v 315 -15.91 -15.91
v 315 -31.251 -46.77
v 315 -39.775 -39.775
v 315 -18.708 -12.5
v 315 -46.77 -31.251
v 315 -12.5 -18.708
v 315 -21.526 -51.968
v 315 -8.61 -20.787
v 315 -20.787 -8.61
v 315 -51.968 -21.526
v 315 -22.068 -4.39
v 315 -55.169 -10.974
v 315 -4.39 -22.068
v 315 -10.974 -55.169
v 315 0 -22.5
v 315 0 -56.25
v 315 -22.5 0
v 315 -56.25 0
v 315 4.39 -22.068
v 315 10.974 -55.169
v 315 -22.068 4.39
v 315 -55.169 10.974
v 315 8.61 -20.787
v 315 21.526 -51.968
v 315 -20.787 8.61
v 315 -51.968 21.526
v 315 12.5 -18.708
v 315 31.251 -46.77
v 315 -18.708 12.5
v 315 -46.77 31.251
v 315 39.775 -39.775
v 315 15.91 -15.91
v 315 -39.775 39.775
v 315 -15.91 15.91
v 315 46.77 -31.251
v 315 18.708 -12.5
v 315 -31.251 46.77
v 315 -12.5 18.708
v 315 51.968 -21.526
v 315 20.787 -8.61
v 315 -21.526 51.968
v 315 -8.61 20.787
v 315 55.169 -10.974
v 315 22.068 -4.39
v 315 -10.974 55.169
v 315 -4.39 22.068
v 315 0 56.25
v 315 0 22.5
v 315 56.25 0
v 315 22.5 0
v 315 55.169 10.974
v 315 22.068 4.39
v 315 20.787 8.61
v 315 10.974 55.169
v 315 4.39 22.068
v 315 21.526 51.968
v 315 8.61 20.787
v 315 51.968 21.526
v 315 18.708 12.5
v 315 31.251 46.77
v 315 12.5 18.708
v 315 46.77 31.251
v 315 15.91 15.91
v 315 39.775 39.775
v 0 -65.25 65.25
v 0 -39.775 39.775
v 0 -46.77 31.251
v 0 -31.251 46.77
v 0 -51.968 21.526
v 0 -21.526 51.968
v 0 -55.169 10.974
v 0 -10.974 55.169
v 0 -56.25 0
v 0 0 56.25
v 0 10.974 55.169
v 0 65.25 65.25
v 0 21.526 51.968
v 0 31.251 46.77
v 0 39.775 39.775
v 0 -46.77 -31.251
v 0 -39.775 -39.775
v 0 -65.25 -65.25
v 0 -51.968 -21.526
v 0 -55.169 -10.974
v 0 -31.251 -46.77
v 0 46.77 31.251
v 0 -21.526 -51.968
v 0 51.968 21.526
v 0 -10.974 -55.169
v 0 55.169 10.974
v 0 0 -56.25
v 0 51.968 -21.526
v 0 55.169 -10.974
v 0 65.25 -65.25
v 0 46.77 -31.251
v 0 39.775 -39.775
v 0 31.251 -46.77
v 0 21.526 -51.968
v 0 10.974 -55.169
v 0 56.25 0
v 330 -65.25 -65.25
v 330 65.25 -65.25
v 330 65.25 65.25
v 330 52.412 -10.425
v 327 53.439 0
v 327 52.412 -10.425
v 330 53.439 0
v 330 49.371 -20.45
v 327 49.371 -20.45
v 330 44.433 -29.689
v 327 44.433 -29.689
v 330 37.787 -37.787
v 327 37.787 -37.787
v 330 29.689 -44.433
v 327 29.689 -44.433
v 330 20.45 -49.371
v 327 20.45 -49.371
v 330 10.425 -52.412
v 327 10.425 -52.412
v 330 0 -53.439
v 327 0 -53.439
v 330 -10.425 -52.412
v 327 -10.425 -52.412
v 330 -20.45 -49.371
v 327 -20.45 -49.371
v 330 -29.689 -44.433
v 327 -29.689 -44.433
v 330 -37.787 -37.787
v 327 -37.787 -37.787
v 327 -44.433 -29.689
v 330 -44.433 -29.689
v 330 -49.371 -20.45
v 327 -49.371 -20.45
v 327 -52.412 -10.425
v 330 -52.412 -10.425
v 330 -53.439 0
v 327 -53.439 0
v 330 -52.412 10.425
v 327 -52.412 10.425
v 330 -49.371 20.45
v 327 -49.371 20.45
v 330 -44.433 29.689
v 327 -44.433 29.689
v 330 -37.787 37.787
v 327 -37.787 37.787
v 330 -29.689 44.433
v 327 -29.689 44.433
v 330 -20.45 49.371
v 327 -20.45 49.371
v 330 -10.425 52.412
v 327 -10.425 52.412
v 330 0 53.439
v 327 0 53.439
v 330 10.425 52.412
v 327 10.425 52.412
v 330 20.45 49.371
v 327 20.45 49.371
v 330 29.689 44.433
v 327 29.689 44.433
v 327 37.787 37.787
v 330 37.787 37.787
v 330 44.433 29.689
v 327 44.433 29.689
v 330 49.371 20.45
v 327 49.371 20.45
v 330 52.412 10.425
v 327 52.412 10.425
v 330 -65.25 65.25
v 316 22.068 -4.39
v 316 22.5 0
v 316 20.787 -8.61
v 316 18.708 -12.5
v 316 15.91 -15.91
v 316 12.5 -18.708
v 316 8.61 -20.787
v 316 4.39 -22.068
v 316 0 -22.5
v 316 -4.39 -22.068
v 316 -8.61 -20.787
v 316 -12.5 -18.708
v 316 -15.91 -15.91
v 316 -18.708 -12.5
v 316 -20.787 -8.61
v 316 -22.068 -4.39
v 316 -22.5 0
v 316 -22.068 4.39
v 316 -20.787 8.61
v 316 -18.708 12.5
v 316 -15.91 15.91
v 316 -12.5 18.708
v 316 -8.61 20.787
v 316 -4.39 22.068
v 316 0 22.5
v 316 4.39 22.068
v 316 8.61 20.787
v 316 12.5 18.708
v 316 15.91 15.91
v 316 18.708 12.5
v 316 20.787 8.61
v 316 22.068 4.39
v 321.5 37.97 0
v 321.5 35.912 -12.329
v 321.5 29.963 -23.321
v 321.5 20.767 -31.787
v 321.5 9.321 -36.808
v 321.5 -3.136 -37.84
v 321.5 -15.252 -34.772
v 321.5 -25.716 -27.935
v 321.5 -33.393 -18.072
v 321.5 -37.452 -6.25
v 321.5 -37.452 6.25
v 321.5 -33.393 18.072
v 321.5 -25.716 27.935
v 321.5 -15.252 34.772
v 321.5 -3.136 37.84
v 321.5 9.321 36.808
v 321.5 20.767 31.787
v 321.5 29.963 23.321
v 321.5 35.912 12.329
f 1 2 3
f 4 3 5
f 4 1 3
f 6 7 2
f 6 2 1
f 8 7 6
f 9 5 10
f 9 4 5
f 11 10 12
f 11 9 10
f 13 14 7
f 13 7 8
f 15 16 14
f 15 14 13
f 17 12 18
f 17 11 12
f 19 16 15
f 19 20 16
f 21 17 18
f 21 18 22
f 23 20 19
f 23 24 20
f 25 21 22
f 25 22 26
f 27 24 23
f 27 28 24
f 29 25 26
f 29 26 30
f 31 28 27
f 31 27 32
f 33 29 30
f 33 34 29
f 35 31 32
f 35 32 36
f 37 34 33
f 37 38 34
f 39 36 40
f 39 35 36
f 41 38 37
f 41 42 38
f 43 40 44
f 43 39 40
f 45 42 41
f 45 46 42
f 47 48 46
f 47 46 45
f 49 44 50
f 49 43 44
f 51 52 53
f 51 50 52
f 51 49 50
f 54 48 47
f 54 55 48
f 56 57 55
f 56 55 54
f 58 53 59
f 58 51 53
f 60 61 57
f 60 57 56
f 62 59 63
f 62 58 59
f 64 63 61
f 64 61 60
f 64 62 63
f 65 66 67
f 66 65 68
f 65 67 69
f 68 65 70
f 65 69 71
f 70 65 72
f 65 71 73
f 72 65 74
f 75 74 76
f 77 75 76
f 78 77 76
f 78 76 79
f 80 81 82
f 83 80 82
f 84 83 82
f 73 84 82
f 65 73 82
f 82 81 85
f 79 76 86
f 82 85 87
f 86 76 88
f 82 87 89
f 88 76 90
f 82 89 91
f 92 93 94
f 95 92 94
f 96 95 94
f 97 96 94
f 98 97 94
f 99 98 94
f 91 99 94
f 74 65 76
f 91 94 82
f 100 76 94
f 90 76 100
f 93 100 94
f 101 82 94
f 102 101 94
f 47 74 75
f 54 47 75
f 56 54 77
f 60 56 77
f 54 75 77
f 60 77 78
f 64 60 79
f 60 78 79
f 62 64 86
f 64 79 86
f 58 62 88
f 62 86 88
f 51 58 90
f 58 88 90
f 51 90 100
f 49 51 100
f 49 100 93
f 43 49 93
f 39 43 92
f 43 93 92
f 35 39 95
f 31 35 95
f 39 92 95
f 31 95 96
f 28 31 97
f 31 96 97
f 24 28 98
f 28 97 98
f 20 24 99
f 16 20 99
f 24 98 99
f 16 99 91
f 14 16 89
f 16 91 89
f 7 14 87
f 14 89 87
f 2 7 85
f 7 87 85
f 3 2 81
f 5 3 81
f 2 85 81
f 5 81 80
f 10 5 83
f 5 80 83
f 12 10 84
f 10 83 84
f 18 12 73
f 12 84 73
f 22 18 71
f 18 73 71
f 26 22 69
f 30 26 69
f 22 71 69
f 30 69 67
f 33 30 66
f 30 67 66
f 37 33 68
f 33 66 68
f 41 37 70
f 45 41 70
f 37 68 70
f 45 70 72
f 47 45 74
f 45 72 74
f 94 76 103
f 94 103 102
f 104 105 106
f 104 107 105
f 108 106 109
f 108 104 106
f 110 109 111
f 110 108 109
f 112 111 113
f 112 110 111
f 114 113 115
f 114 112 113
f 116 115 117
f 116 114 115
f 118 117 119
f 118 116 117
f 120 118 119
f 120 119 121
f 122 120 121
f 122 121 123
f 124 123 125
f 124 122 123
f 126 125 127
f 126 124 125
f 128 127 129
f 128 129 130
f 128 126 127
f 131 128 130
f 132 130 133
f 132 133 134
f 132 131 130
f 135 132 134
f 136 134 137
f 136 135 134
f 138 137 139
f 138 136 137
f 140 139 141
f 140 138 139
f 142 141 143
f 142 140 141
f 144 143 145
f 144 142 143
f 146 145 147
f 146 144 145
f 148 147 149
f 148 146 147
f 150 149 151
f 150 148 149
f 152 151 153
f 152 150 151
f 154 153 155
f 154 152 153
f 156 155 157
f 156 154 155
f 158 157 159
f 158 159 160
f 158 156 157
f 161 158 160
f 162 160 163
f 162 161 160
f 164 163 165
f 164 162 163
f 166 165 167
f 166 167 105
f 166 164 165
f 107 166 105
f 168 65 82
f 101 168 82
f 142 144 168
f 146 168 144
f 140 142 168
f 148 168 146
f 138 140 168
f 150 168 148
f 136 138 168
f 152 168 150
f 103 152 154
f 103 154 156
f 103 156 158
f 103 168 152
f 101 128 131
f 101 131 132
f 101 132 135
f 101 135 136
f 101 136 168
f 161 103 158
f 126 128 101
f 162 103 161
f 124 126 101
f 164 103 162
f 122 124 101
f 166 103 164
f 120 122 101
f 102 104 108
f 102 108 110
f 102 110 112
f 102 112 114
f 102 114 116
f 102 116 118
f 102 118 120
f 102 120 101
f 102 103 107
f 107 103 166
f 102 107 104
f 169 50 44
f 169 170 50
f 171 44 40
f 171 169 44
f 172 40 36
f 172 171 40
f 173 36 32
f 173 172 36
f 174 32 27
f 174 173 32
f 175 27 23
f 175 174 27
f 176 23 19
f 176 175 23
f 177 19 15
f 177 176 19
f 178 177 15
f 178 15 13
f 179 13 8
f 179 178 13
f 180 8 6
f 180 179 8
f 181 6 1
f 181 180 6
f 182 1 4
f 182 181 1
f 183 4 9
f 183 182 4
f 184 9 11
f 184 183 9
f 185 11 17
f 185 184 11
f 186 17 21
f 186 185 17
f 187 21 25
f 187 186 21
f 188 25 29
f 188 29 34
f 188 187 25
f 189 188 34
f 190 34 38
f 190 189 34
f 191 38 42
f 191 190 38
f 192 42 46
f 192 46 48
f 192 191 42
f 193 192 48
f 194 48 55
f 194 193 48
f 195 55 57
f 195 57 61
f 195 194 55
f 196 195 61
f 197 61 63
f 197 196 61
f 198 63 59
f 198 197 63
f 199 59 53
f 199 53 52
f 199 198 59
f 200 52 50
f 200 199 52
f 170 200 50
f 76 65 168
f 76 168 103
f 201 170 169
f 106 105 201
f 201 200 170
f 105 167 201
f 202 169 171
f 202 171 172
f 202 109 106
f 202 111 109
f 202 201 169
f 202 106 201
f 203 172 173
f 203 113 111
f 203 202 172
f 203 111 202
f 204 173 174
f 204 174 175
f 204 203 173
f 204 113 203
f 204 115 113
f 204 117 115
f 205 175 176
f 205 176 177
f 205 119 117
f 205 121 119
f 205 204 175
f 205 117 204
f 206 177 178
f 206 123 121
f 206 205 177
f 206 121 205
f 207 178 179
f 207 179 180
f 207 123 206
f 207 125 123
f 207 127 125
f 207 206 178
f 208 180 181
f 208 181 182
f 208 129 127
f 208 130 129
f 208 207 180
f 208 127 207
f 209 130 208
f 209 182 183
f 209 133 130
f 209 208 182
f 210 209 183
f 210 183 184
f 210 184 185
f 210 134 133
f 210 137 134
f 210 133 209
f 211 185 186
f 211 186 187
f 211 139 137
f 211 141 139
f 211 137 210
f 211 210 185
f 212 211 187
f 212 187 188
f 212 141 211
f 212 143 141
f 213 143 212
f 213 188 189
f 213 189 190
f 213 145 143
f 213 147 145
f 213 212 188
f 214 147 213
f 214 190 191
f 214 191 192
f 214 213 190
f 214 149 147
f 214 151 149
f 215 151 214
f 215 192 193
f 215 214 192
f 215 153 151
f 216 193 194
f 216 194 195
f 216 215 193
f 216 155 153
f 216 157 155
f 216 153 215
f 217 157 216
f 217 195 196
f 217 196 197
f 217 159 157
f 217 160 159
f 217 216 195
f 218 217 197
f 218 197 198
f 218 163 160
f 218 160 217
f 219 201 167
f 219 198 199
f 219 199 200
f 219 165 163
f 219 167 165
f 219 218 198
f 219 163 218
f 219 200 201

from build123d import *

# Parameters (mm, degrees)
SKETCH_1_W          = 130.5
SKETCH_1_H          = 130.5
EXTRUDE_1_DEPTH     = 330
SKETCH_8_R          = 56.25
CUT_EXTRUDE_2_DEPTH = 315


with BuildPart() as part:
    # 草图1 → 凸台-拉伸1 (new body)
    with BuildSketch(Plane(origin=(0, 0, 0), x_dir=(0, 0, -1), z_dir=(1, 0, 0))):
        Rectangle(SKETCH_1_W, SKETCH_1_H)
    extrude(amount=EXTRUDE_1_DEPTH)

    # 草图8 → 切除-拉伸2 (cut)
    with BuildSketch(Plane.ZY):
        Circle(SKETCH_8_R)
    extrude(amount=-CUT_EXTRUDE_2_DEPTH, mode=Mode.SUBTRACT)

    # 草图26 → 切除-旋转3 (revolve, cut)
    with BuildSketch(Plane(origin=(0, 0, 0), x_dir=(-1, 0, 0), z_dir=(0, 0, -1))):
        Polygon((-315, 0), (-315, 22.5), (-316, 22.5), (-327, 53.439293368), (-330, 53.439293368), (-330, 0), align=None)
    revolve(axis=Axis((315, 0, 0), (-1, 0, 0)), mode=Mode.SUBTRACT)


solid = part.part
